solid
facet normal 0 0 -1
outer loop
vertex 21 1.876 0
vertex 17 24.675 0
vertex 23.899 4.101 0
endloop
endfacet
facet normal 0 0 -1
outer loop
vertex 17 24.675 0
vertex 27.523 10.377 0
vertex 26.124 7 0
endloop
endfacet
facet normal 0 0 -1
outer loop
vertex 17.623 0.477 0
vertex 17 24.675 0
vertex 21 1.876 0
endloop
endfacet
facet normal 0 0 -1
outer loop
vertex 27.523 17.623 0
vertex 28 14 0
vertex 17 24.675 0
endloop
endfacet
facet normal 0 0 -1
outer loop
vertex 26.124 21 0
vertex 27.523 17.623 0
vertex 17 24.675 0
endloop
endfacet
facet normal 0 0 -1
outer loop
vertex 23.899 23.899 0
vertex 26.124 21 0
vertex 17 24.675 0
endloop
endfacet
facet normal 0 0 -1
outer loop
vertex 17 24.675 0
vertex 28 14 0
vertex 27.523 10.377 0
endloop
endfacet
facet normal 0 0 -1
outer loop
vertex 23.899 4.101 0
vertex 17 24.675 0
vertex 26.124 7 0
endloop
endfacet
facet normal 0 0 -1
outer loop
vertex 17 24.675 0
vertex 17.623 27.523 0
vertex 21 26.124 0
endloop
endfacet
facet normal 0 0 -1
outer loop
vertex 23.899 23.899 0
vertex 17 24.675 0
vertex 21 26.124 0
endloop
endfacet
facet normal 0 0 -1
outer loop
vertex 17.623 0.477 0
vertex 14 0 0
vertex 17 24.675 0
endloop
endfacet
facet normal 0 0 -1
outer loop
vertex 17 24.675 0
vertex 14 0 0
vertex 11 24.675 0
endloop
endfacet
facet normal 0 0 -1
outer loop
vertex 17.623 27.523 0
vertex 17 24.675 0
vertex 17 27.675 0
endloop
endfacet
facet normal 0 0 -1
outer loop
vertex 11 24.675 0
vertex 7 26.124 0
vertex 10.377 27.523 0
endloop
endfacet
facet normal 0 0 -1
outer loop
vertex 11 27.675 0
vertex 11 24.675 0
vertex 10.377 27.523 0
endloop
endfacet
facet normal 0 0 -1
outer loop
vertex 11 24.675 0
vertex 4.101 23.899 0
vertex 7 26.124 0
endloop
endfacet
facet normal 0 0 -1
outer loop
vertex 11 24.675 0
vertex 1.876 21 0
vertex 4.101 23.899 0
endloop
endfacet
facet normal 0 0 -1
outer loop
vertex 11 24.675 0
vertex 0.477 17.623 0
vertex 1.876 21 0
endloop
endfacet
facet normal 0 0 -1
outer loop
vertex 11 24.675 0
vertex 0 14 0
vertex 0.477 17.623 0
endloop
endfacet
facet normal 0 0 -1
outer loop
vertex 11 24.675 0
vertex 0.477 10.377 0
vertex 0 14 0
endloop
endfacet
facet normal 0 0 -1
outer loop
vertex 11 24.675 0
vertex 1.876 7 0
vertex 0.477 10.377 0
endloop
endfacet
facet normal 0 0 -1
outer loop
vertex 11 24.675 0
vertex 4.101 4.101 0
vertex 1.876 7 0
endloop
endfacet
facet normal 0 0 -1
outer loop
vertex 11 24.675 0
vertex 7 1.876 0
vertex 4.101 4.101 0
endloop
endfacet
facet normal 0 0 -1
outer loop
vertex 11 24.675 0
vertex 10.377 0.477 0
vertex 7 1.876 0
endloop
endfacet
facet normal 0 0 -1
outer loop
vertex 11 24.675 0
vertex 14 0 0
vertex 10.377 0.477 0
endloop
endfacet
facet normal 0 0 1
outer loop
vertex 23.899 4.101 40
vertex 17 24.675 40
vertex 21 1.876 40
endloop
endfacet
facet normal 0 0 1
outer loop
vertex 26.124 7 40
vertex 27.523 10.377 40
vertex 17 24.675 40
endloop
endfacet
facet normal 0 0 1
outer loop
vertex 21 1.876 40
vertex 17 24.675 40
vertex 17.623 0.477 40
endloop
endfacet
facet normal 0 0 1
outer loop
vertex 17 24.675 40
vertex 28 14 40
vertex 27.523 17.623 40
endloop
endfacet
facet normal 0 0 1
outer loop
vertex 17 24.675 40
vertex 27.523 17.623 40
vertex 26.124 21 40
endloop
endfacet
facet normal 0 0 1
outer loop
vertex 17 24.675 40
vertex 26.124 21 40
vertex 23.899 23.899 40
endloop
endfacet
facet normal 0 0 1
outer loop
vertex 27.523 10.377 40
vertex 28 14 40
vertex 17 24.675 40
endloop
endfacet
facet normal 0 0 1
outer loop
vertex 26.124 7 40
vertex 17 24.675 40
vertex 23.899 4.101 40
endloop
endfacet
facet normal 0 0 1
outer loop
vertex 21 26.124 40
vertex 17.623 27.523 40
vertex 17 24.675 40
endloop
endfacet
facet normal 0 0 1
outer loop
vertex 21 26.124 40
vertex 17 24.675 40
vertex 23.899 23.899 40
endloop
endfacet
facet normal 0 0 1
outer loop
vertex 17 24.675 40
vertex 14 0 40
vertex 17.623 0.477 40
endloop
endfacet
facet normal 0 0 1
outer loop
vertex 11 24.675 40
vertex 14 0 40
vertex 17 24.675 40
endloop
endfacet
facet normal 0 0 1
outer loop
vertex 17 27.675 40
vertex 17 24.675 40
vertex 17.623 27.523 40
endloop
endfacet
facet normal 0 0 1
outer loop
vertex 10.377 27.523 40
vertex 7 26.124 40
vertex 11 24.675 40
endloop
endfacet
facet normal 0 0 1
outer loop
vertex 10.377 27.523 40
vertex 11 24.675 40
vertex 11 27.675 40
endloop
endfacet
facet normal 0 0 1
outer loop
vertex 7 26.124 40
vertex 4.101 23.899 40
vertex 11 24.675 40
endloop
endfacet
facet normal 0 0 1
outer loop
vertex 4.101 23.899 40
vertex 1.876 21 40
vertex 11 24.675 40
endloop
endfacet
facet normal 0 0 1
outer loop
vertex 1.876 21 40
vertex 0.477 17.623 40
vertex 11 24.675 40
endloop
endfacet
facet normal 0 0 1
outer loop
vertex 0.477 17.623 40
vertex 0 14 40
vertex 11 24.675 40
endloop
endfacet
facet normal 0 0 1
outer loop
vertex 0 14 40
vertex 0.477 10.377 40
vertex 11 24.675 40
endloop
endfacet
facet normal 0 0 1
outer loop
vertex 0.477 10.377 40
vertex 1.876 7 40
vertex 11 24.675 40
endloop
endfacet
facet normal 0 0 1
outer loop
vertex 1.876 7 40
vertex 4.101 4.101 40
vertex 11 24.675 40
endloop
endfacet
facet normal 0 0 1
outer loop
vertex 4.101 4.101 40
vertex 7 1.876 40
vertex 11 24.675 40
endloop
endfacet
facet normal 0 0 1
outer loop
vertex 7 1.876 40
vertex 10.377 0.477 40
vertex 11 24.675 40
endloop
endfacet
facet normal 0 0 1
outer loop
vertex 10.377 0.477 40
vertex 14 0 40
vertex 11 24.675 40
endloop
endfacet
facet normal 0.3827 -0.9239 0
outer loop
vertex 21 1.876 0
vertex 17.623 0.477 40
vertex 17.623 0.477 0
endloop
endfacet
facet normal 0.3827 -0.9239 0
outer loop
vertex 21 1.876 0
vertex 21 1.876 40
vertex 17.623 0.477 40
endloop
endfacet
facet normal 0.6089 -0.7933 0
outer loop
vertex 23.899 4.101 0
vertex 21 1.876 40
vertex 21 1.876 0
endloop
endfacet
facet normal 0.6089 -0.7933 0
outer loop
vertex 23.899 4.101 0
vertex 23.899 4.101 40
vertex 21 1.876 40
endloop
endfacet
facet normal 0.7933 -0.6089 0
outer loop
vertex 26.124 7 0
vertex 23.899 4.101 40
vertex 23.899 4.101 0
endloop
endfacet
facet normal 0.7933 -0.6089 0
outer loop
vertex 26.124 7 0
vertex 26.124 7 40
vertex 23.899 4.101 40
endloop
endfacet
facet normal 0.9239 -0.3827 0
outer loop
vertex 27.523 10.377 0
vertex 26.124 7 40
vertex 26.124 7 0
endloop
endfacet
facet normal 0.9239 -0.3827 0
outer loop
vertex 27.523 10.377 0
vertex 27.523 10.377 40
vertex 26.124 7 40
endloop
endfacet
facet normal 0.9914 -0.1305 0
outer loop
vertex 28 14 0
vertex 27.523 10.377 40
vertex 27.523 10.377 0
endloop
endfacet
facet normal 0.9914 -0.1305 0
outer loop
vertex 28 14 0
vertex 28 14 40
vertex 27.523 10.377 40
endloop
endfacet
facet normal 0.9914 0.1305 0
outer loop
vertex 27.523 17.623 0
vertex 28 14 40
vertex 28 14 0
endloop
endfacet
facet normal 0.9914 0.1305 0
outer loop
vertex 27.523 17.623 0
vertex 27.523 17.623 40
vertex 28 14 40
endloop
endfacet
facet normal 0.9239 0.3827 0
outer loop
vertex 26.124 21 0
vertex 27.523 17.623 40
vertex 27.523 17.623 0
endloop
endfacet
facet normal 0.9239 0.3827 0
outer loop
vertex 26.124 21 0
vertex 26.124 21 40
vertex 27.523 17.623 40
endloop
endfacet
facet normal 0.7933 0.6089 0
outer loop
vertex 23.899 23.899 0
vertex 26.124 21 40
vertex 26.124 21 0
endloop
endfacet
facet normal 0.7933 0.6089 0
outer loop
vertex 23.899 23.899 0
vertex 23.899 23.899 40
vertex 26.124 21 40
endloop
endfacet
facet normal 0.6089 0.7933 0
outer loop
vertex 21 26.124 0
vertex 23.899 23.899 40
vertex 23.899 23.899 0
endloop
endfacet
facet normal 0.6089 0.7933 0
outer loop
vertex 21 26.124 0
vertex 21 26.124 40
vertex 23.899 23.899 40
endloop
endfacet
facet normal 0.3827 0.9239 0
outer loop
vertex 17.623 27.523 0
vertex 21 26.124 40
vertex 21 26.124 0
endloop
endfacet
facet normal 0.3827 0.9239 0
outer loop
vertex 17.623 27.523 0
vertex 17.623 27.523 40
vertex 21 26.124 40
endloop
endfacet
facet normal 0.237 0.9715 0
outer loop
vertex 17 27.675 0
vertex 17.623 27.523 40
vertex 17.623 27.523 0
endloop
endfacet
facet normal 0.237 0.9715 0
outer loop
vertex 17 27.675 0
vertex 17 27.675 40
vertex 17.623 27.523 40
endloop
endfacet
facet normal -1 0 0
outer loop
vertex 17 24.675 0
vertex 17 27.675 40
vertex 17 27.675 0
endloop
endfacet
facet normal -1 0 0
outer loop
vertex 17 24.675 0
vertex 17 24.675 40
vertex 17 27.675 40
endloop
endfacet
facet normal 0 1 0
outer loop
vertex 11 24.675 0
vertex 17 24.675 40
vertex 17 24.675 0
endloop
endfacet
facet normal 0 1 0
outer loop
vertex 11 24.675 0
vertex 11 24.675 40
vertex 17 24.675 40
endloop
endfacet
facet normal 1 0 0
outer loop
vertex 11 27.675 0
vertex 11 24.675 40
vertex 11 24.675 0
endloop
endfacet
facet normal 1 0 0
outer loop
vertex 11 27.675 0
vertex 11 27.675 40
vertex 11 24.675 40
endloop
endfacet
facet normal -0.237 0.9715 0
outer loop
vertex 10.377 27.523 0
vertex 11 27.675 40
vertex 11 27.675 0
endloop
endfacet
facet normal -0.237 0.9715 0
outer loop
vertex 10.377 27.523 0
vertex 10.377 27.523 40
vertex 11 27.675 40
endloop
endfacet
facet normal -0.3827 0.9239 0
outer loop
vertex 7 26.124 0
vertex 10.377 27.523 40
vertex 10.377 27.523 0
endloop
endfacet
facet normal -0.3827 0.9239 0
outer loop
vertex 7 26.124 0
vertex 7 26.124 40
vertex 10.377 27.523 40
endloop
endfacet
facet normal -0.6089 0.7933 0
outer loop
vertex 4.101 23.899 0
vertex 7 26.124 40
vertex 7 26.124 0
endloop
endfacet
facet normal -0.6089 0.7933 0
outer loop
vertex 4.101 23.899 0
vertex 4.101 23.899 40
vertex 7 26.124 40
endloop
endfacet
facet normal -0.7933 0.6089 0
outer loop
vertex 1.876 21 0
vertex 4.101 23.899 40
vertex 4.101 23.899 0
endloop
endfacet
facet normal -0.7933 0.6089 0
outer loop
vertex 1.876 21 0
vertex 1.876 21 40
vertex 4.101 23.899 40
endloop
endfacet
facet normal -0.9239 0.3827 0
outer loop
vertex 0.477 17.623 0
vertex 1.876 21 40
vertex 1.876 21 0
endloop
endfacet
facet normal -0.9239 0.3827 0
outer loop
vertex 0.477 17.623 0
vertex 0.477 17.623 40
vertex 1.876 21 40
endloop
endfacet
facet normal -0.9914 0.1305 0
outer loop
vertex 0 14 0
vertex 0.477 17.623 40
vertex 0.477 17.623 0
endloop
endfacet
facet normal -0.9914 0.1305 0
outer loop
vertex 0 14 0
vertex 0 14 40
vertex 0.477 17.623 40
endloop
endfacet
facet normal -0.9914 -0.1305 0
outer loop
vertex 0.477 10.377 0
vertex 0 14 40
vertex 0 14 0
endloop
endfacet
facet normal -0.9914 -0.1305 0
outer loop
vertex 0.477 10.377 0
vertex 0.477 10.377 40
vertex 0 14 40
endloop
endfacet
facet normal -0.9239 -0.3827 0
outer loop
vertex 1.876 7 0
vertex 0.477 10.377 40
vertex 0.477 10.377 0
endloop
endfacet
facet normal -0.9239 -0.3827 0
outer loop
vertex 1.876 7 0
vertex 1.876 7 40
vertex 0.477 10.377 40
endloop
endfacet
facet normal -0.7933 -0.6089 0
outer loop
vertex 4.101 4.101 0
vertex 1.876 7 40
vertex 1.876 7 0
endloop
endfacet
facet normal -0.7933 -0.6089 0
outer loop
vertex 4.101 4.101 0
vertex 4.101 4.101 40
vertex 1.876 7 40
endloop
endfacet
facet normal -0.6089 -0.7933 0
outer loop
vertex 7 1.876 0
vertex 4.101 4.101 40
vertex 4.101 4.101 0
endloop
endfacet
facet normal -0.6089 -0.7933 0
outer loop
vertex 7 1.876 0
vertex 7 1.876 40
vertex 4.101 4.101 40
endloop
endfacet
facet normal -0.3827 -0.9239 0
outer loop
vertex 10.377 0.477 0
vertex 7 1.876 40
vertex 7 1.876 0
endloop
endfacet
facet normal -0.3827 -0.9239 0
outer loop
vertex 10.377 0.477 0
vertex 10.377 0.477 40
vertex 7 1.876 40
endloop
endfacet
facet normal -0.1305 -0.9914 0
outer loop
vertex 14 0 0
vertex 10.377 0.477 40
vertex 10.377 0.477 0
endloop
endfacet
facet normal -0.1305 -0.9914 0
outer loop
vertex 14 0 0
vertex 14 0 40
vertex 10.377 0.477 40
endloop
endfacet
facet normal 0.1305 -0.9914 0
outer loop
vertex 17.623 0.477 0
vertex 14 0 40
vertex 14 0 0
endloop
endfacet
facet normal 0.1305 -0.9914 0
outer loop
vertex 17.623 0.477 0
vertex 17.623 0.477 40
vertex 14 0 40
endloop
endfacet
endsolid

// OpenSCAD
$fn = 32;

// ----------------------------------------------------------------------
// Keyway shaft: d28 shaft, key 6 x 3 mm
// ----------------------------------------------------------------------

// --- parameters (mm) ---
shaft_r = 14;             // shaft radius
key_w = 6;                // keyway width
key_d = 3;                // keyway depth below the surface line
plate_t = 40;             // shaft length, Z (extrusion height)

shaft_d = 2 * shaft_r;  // shaft diameter
circle_step = 15;  // polygon sampling step, degrees

profile = [[10.377, 27.523], [7, 26.124], [4.101, 23.899], [1.876, 21], [0.477, 17.623], [0, 14], [0.477, 10.377], [1.876, 7], [4.101, 4.101], [7, 1.876], [10.377, 0.477], [14, 0], [17.623, 0.477], [21, 1.876], [23.899, 4.101], [26.124, 7], [27.523, 10.377], [28, 14], [27.523, 17.623], [26.124, 21], [23.899, 23.899], [21, 26.124], [17.623, 27.523], [17, 27.675], [17, 24.675], [11, 24.675], [11, 27.675]];  // primary outline, 27 points, counter clockwise

// --- the one profile operation ---
linear_extrude(height = plate_t) polygon(points = profile);
